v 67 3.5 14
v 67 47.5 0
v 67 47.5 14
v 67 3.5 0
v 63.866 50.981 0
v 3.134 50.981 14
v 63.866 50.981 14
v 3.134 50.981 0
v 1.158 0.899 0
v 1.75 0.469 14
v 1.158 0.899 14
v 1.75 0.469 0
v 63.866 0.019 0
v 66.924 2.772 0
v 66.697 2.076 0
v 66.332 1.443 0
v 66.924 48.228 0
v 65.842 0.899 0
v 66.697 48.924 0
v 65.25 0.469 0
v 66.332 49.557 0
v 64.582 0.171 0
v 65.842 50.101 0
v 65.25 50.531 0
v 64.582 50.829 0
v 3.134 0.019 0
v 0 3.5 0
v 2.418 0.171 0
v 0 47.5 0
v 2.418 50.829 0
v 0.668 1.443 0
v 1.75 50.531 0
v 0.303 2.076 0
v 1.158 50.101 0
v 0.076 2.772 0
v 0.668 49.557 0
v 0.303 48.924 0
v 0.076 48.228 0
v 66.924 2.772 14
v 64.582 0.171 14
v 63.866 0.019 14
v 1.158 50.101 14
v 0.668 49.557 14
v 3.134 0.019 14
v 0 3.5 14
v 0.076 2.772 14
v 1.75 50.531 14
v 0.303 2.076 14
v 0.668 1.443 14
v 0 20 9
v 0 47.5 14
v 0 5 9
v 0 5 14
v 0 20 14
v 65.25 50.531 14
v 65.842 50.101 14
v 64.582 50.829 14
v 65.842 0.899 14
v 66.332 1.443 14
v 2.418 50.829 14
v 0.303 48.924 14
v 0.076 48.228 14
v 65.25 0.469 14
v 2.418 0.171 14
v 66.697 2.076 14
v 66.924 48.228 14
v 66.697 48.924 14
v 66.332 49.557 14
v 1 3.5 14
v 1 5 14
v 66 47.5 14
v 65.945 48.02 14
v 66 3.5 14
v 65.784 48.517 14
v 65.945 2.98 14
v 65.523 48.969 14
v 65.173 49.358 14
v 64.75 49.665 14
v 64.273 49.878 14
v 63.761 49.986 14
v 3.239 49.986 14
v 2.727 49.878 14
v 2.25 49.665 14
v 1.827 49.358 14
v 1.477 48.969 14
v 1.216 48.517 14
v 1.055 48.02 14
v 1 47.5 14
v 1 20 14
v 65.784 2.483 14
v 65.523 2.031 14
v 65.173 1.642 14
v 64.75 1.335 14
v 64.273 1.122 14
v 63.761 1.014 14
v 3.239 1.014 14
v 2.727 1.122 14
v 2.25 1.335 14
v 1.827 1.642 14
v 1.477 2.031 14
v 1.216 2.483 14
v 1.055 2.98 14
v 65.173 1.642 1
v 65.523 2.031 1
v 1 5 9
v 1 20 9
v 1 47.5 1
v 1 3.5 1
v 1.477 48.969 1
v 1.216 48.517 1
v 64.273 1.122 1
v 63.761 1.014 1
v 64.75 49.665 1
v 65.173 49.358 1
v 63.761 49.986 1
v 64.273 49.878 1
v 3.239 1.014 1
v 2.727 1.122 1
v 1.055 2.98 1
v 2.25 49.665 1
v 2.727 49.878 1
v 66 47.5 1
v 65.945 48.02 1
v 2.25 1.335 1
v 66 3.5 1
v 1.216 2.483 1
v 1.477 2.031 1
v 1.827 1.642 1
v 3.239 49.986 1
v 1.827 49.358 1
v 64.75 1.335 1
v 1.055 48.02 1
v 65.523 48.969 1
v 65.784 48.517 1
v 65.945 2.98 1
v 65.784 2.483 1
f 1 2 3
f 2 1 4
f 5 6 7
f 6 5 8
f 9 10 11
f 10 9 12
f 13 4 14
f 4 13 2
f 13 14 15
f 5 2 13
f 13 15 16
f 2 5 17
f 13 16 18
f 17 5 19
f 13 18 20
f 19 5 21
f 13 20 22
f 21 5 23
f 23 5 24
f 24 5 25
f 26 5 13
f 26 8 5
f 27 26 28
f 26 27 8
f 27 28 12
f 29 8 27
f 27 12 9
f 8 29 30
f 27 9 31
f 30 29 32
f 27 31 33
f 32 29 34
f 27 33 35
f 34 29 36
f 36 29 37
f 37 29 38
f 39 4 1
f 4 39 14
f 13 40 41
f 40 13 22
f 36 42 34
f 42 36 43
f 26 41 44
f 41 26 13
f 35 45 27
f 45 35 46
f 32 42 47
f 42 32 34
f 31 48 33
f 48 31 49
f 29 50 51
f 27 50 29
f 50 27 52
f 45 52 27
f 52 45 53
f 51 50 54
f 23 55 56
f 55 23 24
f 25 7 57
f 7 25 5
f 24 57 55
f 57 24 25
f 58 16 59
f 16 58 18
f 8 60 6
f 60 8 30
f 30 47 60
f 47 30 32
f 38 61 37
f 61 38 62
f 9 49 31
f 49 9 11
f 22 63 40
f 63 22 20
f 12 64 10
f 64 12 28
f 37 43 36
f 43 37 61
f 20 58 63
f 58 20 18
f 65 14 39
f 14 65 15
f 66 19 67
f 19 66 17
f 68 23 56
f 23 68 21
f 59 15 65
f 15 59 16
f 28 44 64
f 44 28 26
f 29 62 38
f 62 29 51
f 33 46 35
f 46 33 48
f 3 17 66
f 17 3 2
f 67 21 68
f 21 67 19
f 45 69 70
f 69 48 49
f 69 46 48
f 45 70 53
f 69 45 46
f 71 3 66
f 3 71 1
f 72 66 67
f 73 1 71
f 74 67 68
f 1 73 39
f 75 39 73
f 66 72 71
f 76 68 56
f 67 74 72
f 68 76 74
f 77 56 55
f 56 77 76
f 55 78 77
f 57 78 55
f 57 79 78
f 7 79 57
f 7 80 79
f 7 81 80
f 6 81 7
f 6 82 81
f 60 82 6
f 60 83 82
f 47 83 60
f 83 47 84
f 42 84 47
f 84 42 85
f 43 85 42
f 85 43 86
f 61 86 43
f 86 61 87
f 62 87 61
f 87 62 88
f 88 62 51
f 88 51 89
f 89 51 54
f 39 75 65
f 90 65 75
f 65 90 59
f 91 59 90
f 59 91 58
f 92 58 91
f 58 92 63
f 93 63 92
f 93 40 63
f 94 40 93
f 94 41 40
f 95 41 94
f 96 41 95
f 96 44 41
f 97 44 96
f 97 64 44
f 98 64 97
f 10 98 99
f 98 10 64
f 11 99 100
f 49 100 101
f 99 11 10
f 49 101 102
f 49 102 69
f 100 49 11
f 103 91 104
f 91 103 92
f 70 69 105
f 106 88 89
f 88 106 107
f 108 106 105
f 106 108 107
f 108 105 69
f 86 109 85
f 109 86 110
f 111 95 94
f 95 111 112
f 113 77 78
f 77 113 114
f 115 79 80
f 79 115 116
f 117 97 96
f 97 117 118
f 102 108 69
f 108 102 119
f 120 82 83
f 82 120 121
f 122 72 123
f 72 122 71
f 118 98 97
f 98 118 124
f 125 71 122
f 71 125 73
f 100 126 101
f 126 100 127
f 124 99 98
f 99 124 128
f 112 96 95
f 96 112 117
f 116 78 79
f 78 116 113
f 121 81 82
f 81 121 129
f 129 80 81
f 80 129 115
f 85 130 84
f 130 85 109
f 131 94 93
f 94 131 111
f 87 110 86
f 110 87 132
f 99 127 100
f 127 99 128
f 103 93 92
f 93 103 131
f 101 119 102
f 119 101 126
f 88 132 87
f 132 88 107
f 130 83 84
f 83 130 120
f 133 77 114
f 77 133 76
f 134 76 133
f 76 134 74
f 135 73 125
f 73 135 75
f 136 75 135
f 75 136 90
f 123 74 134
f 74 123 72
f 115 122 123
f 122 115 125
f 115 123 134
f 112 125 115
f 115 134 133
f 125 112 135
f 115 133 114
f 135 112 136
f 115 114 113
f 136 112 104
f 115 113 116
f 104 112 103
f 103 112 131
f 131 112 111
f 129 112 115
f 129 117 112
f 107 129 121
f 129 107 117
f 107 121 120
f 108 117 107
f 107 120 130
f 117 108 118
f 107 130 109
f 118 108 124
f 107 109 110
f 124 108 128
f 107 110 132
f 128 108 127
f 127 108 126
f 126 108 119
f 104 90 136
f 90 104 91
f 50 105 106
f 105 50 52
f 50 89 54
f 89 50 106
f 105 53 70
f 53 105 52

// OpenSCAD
$fn = 30;


tp_h = 1.6;
tp_w = 65.0;
tp_d = 49.0;
tp_r = 2.5;
overlay_h = 1;

wall_t = 1;
plate_t = 0.6;

box_h = 14;
box_w = tp_w + 2*wall_t;
box_d = tp_d + 2*wall_t;
box_r = tp_r + wall_t;

module rounded_cube(x, y, z, r) {
    hull() {
        translate([r, r, 0])
        cylinder(r=r, h=z);
        translate([x-r, r, 0])
        cylinder(r=r, h=z);
        translate([x-r, y-r, 0])
        cylinder(r=r, h=z);
        translate([r, y-r, 0])
        cylinder(r=r, h=z);
    }
}


module touchpad_case() {
    difference() {
        rounded_cube(box_w, box_d, box_h, box_r);
        translate([wall_t, wall_t, overlay_h])
            rounded_cube(tp_w, tp_d, box_h, tp_r);
        translate([-5, 5, 9])
            cube([10, 15, 10]);
    }
}

touchpad_case();
